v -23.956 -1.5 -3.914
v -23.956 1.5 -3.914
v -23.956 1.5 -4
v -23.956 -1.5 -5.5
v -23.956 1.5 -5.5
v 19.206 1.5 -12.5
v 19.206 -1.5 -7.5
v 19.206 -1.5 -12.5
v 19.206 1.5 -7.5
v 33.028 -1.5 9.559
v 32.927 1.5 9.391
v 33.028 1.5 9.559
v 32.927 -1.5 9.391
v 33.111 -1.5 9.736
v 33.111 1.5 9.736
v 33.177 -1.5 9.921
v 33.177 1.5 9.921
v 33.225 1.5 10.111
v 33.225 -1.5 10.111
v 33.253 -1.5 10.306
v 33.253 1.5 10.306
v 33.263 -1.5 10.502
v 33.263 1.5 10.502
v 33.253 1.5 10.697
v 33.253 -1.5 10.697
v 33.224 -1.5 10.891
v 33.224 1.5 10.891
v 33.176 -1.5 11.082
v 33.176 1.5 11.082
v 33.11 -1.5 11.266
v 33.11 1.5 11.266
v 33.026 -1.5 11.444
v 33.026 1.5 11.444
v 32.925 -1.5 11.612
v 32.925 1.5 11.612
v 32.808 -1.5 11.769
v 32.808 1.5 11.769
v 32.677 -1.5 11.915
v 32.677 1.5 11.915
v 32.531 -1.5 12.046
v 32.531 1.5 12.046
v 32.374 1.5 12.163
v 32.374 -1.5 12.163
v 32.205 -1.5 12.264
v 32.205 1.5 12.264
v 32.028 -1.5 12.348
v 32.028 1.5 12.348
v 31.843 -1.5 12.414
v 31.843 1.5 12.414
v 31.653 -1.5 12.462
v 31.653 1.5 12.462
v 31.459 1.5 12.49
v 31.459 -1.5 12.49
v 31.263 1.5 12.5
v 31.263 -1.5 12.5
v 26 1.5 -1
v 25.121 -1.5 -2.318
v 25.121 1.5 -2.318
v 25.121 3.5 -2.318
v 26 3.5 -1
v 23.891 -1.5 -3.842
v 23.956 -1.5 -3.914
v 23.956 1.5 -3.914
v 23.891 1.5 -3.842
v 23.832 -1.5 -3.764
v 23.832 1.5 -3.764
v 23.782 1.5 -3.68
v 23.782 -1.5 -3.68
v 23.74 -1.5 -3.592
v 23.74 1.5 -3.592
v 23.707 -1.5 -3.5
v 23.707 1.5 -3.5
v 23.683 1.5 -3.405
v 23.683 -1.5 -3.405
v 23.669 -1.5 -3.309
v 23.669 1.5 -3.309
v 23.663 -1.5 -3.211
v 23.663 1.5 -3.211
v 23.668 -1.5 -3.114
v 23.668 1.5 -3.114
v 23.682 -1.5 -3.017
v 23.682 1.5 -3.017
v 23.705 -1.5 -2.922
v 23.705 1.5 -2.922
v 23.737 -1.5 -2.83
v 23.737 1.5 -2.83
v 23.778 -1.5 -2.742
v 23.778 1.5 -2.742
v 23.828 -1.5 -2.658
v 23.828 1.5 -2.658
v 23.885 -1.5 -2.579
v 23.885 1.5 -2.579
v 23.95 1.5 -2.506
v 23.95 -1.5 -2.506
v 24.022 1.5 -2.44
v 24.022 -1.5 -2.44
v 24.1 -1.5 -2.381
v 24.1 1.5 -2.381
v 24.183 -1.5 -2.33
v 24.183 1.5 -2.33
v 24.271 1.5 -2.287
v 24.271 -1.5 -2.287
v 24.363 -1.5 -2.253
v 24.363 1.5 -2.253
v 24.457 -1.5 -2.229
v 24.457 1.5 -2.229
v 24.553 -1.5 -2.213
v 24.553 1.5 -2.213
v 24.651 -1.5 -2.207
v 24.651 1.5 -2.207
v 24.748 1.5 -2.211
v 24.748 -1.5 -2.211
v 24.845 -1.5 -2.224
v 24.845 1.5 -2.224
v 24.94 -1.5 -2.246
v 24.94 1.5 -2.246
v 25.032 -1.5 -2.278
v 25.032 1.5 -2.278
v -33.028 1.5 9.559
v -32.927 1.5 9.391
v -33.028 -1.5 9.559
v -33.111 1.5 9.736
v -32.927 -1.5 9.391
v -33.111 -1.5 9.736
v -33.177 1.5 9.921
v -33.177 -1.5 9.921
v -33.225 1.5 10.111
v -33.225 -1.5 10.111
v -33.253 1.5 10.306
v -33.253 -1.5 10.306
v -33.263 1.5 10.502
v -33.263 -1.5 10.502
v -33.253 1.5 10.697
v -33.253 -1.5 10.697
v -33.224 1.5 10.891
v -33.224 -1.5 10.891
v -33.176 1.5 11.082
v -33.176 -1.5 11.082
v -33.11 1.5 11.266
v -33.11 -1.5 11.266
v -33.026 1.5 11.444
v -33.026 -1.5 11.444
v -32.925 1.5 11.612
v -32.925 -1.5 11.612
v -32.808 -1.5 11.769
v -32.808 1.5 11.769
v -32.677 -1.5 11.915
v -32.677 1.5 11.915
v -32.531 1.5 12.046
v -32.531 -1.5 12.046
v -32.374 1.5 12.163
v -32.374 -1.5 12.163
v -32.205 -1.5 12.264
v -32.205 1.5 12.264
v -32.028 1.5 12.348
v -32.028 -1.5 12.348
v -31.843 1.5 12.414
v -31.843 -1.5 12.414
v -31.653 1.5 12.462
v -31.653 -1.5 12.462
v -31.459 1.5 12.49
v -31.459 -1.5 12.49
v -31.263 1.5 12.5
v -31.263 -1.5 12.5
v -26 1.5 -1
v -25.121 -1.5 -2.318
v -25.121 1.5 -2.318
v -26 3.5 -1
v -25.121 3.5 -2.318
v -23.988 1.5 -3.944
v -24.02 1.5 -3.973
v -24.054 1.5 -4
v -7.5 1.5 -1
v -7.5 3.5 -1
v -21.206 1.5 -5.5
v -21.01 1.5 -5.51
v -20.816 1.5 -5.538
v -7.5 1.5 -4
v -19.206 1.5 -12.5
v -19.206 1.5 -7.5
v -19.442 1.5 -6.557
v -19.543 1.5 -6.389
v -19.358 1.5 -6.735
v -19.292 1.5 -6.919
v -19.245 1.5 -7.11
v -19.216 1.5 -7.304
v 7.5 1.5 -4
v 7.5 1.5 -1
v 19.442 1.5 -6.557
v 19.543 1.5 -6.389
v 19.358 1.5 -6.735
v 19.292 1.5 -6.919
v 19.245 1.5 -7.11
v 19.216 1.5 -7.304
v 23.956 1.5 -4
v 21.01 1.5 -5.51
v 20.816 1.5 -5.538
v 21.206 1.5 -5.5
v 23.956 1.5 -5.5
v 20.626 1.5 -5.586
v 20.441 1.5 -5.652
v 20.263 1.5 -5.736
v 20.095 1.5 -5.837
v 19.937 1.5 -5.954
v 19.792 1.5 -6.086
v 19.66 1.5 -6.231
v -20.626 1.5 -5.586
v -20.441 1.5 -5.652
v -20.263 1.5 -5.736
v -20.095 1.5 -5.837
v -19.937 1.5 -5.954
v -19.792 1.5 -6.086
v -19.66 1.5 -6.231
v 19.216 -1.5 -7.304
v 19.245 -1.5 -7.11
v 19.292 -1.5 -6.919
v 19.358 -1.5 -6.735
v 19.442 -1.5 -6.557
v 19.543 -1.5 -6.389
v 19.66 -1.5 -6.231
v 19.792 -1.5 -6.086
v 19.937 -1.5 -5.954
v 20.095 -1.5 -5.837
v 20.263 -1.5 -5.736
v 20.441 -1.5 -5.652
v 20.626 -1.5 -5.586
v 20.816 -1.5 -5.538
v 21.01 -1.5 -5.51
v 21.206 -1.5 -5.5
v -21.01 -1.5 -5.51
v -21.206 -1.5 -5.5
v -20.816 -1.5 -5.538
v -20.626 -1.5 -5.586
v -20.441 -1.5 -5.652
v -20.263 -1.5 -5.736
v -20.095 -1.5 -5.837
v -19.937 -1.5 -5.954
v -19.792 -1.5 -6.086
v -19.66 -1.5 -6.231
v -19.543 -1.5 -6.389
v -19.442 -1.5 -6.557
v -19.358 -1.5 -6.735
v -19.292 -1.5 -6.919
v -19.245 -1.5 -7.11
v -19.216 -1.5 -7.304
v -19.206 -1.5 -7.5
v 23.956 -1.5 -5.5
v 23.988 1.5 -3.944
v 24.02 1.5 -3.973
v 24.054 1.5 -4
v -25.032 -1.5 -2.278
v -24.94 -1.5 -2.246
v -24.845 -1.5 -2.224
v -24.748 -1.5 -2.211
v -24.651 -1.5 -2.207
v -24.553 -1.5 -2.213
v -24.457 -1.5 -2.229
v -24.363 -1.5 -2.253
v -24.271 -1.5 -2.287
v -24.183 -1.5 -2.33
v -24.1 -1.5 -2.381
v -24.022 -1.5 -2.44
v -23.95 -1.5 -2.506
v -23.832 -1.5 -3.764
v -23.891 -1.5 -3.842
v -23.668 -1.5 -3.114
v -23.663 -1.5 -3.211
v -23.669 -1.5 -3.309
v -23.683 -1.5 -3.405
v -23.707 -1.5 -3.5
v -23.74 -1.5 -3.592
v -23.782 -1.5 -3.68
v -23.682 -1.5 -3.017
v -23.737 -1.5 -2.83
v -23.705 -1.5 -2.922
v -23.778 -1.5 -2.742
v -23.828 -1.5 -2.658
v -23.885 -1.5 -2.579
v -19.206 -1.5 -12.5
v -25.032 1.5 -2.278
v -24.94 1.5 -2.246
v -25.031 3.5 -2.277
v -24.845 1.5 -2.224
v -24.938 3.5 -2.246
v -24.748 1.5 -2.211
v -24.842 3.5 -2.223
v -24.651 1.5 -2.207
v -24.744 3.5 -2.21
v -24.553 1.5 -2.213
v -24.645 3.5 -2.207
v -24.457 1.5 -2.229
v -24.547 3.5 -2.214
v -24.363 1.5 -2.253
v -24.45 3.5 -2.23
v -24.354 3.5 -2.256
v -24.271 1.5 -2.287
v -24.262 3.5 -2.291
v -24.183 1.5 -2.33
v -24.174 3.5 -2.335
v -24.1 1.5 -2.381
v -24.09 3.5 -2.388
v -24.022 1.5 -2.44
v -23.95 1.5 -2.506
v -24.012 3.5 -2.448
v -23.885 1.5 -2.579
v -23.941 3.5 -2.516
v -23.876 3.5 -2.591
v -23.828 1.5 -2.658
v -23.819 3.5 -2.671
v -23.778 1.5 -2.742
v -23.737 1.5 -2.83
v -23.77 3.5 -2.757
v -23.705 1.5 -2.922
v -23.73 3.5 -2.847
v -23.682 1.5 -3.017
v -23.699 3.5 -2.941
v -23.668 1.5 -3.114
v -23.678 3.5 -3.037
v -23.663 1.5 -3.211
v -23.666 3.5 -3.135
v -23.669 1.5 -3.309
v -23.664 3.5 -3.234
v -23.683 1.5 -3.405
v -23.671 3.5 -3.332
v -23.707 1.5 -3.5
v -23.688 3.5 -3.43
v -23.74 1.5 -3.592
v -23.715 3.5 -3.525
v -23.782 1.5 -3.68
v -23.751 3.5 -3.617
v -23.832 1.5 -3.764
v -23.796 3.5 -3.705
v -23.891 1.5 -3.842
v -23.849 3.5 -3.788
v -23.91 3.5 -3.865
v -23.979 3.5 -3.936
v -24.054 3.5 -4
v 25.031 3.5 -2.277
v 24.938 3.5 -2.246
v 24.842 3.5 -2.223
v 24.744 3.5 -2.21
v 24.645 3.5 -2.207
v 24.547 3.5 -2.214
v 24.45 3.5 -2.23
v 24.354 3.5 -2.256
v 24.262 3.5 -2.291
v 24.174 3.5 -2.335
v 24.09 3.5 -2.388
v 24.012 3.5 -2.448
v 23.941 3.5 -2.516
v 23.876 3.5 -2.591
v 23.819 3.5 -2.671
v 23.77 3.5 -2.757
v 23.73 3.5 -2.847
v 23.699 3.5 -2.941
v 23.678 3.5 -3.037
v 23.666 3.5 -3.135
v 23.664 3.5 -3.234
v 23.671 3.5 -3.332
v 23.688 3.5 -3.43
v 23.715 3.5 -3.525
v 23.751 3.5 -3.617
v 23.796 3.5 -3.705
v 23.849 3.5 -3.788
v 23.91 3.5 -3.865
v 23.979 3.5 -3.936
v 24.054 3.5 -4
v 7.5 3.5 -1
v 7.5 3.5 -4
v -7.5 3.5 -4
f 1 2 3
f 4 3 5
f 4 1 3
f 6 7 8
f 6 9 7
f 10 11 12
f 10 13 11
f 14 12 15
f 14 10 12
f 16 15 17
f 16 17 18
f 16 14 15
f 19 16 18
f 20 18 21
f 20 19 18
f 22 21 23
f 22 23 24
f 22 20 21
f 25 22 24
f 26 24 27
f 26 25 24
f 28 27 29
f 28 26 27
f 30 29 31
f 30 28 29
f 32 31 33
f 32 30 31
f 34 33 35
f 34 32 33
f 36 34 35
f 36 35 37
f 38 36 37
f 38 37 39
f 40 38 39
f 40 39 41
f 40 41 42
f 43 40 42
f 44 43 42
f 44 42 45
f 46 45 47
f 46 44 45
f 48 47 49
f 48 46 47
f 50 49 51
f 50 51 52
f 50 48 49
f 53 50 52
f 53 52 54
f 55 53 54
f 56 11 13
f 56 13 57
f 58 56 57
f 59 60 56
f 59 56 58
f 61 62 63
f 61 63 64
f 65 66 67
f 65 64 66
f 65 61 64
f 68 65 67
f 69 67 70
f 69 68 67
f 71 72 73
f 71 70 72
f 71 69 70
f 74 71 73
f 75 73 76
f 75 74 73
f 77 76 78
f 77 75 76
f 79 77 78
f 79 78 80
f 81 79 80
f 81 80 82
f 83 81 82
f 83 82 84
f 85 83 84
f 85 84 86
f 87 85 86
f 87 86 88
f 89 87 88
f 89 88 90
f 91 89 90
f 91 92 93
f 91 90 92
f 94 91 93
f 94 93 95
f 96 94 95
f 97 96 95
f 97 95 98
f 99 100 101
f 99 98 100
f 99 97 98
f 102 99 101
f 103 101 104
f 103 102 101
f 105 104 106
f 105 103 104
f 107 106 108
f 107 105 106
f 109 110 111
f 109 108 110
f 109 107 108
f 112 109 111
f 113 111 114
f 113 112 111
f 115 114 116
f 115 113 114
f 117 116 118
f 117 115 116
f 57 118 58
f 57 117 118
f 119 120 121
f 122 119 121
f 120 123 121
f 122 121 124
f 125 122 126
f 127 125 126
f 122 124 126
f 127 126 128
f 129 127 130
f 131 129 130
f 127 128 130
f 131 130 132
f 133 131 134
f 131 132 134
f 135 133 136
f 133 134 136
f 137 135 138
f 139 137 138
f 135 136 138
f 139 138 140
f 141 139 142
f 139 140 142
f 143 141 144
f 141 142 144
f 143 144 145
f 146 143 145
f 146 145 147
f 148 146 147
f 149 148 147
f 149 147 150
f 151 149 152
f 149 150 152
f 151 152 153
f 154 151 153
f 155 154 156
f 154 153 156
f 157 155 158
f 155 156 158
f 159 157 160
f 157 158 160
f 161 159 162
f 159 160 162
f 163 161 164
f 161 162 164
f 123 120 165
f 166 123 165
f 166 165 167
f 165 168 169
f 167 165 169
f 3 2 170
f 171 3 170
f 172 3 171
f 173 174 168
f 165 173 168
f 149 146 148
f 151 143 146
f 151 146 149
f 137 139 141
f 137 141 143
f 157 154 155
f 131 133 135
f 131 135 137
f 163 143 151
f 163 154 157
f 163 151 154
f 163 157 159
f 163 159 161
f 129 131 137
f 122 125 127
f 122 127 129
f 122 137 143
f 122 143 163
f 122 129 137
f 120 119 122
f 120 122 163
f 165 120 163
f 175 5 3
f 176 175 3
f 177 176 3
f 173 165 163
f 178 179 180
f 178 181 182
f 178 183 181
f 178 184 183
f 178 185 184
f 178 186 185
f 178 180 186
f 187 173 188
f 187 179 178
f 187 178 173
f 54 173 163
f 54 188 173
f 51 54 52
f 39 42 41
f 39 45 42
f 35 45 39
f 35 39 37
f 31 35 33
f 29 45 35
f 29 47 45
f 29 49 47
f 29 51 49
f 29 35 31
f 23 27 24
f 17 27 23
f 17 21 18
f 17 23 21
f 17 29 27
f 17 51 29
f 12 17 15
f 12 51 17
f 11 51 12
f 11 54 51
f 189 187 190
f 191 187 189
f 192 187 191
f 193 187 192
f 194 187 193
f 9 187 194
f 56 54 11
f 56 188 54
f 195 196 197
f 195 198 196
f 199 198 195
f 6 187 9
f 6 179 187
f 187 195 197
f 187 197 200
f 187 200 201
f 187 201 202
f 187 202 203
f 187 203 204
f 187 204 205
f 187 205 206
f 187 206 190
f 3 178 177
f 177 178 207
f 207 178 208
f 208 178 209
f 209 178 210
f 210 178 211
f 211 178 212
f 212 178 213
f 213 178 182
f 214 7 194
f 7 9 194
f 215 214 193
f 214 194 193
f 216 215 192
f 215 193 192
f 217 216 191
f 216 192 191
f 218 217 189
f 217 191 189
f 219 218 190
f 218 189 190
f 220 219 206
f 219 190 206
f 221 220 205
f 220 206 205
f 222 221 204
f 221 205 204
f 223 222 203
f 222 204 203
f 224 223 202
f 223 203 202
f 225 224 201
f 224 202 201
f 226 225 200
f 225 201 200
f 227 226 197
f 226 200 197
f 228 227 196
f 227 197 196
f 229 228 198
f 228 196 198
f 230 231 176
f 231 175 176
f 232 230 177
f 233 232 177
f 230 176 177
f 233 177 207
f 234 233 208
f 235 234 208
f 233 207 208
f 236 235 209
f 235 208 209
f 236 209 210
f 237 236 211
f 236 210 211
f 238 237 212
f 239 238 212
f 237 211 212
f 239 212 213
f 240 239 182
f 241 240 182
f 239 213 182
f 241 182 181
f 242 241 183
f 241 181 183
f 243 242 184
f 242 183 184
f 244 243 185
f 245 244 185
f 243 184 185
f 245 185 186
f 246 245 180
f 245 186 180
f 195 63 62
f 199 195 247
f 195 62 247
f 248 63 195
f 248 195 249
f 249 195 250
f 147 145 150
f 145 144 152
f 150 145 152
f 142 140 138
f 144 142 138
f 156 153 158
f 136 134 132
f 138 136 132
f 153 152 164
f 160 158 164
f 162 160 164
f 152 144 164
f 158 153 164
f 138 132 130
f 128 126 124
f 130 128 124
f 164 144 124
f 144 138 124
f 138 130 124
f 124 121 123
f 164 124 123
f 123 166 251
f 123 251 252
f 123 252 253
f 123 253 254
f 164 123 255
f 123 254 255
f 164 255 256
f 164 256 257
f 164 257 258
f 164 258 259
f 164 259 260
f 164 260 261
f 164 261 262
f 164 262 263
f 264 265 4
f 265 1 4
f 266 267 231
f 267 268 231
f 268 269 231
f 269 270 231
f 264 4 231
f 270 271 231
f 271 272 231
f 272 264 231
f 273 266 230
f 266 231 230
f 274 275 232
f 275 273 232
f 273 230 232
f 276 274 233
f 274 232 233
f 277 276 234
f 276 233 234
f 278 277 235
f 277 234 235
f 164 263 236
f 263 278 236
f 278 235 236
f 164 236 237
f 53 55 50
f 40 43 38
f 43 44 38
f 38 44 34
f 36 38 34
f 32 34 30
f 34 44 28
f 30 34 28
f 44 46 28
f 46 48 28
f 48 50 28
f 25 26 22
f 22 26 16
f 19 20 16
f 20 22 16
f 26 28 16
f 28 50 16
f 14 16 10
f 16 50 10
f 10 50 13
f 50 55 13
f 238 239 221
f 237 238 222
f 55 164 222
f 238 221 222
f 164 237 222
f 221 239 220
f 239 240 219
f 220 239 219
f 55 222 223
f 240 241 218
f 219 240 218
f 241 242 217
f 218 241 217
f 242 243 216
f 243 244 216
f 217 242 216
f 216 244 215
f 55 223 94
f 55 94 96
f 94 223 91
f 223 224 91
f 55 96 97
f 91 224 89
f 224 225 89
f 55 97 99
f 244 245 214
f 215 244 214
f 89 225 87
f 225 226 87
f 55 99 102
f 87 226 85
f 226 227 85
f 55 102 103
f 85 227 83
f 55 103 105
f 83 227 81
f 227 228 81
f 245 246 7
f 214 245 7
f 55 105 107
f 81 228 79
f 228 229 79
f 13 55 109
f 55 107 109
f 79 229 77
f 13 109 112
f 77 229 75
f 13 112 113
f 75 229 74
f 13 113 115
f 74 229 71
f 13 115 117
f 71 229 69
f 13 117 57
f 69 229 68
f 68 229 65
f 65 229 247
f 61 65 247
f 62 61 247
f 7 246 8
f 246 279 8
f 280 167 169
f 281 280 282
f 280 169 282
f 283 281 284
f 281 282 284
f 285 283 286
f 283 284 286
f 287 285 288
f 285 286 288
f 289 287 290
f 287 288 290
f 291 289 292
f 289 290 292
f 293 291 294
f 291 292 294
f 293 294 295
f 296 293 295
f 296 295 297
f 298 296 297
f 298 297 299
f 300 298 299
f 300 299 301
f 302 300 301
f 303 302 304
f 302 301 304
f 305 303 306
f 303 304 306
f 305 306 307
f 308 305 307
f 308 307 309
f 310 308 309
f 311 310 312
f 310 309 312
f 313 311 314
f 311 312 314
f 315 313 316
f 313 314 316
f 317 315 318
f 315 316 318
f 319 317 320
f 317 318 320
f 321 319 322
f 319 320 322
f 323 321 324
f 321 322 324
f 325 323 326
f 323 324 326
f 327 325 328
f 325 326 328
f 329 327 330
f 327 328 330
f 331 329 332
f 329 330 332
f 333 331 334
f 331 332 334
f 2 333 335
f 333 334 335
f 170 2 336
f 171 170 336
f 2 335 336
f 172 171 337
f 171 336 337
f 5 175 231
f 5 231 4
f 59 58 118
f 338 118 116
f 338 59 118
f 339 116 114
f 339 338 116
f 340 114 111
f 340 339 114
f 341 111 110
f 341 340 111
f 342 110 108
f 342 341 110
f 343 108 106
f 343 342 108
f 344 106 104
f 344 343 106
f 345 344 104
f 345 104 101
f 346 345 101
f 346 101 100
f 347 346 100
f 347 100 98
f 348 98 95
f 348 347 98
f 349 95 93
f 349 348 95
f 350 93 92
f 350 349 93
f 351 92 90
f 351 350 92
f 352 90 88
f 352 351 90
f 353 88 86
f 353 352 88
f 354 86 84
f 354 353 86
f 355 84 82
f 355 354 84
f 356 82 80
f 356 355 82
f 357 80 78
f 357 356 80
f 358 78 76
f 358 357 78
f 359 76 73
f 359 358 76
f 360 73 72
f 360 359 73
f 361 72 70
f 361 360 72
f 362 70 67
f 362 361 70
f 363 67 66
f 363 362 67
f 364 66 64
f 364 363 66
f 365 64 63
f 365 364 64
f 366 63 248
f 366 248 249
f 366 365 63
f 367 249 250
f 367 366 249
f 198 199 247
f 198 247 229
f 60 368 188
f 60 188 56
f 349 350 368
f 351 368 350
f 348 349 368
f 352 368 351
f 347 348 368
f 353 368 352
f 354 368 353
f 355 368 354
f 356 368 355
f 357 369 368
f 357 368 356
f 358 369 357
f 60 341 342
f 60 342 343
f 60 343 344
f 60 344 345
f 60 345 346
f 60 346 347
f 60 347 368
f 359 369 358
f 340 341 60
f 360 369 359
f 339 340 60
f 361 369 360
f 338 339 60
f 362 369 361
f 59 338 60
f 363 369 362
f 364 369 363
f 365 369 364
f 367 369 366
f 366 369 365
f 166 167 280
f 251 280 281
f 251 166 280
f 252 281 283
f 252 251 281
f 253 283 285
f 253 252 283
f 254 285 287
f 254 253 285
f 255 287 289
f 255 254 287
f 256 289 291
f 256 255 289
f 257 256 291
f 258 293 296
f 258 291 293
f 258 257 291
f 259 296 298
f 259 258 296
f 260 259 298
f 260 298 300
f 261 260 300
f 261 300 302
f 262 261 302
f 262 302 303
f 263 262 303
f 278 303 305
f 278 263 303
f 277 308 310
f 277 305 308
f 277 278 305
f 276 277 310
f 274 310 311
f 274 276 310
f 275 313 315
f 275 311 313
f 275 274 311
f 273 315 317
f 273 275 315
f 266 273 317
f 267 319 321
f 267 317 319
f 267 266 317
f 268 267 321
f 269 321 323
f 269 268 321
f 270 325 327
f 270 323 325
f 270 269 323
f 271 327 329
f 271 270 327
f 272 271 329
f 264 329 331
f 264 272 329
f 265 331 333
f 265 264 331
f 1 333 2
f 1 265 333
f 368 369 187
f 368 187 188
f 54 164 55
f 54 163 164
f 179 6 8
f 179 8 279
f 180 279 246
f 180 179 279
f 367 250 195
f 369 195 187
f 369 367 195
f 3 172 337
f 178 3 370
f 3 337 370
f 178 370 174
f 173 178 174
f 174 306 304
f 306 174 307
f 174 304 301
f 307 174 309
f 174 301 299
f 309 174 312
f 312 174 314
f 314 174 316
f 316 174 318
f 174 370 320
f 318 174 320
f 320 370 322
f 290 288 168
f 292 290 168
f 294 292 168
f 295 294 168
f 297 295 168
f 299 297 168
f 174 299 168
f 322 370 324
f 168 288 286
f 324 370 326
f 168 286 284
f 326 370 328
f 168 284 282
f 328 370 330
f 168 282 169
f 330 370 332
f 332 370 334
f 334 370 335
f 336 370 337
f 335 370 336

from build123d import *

# Parameters (mm, degrees)
BOSS_EXTRUDE1_DEPTH     = 1.5
CUT_EXTRUDE4_DEPTH      = 38.286056375
CUT_EXTRUDE4_DEPTH_BACK = 38.286056375
SKETCH4_W               = 0.25
SKETCH4_H               = 3
CUT_EXTRUDE5_DEPTH      = 38.286056375
CUT_EXTRUDE5_DEPTH_BACK = 38.286056375
SKETCH5_R               = 1
FILLET5_R               = 2
BOSS_EXTRUDE2_START     = 2
BOSS_EXTRUDE2_DEPTH     = 2


with BuildPart() as part:
    # Sketch1 → Boss-Extrude1 (new, symmetric)
    with BuildSketch(Plane(origin=(0, 0, 0), x_dir=(1, 0, 0), z_dir=(0, 1, 0))):
        Polygon((-25, -12.5), (25, -12.5), (35, -12.5), (25, 2.5), (24.20625, 2.5), (24.20625, 5.5), (19.20625, 5.5), (19.20625, 12.5), (-19.20625, 12.5), (-19.20625, 5.5), (-24.20625, 5.5), (-24.20625, 2.5), (-25, 2.5), (-35, -12.5), align=None)
    extrude(amount=BOSS_EXTRUDE1_DEPTH, both=True)

    # Sketch4 → Cut-Extrude4 (cut, two sides: drawn at the far end of the back side and taken through both)
    with BuildSketch(Plane(origin=(0, 1.5, 0), x_dir=(1, 0, 0), z_dir=(0, 1, 0)).offset(-CUT_EXTRUDE4_DEPTH_BACK)):
        with Locations((24.08125, 4)):
            Rectangle(SKETCH4_W, SKETCH4_H)
        with Locations((-24.08125, 4)):
            Rectangle(SKETCH4_W, SKETCH4_H)
    extrude(amount=CUT_EXTRUDE4_DEPTH + CUT_EXTRUDE4_DEPTH_BACK, mode=Mode.SUBTRACT)

    # Sketch5 → Cut-Extrude5 (cut, two sides: drawn at the far end of the back side and taken through both)
    with BuildSketch(Plane(origin=(0, 1.5, 0), x_dir=(1, 0, 0), z_dir=(0, 1, 0)).offset(-CUT_EXTRUDE5_DEPTH_BACK)):
        with Locations((-24.663356781, 3.207106781)):
            Circle(SKETCH5_R)
        with Locations((24.663356781, 3.207106781)):
            Circle(SKETCH5_R)
    extrude(amount=CUT_EXTRUDE5_DEPTH + CUT_EXTRUDE5_DEPTH_BACK, mode=Mode.SUBTRACT)

    # Fillet5
    fillet5_edges = [part.edges().sort_by_distance(p)[0] for p in [
        (-35, 0, 12.5),
        (-19.20625, 0, -5.5),
        (19.20625, 0, -5.5),
        (35, 0, 12.5),
    ]]
    fillet(fillet5_edges, radius=FILLET5_R)

    # Sketch6 → Boss-Extrude2 (add)
    with BuildSketch(Plane(origin=(0, 1.5, 0), x_dir=(1, 0, 0), z_dir=(0, 1, 0)).offset(BOSS_EXTRUDE2_START)):
        with BuildLine():
            Line((-24.053996179, 4), (-7.5, 4))
            Line((-7.5, 4), (-7.5, 1))
            Line((-7.5, 1), (-26, 1))
            Line((-26, 1), (-25.121262614, 2.318106079))
            ThreePointArc((-25.121262614, 2.318106079), (-23.819007075, 2.671314309), (-24.053996179, 4))
        make_face()
        with BuildLine():
            Line((26, 1), (25.121262614, 2.318106079))
            ThreePointArc((25.121262614, 2.318106079), (23.819007075, 2.671314309), (24.053996179, 4))
            Line((24.053996179, 4), (7.5, 4))
            Line((7.5, 4), (7.5, 1))
            Line((7.5, 1), (26, 1))
        make_face()
    extrude(amount=-BOSS_EXTRUDE2_DEPTH)


solid = part.part
